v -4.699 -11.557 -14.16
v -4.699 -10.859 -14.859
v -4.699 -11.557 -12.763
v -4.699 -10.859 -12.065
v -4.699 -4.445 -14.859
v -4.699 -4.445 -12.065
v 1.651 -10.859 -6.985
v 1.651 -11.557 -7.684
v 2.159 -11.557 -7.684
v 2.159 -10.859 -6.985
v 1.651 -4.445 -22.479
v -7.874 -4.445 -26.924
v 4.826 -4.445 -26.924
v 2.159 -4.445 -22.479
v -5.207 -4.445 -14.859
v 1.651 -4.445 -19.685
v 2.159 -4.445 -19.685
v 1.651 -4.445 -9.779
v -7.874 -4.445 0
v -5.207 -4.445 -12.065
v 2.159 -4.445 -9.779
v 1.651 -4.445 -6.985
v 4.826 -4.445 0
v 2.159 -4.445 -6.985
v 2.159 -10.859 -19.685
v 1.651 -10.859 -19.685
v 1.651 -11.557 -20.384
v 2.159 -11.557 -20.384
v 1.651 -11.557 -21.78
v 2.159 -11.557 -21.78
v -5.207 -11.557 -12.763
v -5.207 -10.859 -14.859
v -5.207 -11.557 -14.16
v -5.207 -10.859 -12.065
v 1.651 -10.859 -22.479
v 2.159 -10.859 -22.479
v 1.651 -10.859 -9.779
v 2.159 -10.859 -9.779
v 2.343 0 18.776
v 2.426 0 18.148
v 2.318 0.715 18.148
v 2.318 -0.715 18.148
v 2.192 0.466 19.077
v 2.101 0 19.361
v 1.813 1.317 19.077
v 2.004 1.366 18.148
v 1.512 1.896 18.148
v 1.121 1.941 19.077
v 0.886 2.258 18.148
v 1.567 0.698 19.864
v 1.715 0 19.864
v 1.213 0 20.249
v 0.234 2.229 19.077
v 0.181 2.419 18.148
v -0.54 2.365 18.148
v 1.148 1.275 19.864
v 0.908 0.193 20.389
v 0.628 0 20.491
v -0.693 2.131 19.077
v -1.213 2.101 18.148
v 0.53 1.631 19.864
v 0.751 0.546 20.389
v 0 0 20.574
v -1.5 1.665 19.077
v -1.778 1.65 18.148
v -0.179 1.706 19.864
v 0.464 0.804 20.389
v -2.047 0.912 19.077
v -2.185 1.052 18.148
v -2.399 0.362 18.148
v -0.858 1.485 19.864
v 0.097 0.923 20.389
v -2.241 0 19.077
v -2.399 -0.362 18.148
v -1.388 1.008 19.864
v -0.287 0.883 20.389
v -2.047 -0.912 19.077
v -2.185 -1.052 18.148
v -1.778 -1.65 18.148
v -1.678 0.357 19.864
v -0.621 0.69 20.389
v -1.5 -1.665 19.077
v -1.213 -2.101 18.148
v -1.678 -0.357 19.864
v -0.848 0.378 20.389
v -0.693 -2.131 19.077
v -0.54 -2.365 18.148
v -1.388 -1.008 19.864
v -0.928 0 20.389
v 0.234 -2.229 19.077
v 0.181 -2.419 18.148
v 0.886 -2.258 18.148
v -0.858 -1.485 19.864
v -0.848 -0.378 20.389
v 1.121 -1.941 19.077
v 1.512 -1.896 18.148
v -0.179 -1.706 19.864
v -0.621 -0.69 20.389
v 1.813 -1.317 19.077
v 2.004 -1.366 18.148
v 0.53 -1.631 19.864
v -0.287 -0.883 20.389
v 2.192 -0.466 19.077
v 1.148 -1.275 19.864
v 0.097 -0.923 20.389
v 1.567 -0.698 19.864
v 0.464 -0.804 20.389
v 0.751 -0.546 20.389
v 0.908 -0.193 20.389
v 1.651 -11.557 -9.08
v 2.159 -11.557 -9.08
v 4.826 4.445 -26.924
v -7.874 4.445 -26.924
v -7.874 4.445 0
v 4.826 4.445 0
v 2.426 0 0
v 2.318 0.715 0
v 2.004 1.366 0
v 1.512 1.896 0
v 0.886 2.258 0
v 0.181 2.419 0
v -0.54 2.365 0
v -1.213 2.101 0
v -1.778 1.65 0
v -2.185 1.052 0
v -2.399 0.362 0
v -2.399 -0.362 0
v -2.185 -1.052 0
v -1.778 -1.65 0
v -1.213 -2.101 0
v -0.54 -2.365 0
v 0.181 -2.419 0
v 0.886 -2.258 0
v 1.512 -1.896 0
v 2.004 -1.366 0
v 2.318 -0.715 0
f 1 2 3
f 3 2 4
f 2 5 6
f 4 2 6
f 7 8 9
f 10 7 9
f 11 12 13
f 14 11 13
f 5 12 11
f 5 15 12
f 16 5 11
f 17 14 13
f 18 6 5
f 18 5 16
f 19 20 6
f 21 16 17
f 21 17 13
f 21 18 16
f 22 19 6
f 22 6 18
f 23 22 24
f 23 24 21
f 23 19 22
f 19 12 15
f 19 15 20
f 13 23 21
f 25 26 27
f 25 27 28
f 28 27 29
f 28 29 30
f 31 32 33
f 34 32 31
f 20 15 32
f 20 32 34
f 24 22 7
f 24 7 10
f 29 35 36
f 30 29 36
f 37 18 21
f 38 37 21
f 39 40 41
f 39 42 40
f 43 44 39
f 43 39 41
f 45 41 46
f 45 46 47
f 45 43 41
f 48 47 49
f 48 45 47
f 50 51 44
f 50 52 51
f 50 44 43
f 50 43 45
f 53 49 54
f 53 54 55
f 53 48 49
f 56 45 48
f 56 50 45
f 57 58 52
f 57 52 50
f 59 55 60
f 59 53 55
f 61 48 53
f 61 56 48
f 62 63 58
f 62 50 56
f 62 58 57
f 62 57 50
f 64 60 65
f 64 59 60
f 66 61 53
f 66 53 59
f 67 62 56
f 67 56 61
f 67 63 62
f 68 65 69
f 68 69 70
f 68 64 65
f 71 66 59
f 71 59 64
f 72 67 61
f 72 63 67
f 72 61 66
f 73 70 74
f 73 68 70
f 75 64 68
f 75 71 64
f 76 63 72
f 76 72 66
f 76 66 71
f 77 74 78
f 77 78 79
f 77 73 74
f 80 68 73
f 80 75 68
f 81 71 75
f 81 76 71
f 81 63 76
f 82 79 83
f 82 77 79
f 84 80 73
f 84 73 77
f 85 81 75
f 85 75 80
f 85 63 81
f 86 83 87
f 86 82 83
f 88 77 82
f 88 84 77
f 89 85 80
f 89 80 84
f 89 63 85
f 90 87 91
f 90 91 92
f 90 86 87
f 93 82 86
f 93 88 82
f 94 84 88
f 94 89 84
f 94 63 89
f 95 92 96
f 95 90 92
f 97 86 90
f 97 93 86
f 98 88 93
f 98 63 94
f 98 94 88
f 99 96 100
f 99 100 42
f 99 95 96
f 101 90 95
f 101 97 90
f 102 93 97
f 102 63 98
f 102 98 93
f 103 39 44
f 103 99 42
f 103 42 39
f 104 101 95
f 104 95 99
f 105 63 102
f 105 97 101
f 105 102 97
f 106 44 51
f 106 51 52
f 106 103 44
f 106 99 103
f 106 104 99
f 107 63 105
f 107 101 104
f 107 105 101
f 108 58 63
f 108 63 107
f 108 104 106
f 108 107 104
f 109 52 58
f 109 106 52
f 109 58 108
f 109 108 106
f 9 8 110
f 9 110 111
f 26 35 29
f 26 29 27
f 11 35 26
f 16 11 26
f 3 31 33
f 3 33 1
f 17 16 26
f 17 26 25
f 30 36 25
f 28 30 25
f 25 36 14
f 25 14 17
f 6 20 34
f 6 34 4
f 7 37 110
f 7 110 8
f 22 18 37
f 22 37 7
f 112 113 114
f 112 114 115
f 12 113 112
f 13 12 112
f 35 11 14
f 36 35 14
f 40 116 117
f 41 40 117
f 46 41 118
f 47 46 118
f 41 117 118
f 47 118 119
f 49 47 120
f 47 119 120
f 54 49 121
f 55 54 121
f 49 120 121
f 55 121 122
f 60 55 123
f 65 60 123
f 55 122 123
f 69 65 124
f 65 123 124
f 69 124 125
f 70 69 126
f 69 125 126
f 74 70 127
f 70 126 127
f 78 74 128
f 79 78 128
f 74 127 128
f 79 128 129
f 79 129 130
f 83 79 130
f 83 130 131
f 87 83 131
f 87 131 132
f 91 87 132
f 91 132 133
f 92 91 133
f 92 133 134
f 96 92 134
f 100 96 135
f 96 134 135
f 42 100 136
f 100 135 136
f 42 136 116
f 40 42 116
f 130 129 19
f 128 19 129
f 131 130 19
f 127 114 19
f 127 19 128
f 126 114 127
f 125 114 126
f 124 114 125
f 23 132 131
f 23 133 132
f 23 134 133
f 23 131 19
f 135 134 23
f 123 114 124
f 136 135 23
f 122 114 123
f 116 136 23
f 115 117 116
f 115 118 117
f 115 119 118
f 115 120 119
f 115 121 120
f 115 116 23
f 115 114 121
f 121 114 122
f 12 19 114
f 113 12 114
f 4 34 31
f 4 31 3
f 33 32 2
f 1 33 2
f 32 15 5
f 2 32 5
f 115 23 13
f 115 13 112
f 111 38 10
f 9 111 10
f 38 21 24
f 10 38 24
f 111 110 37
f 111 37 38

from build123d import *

# Parameters (mm, degrees)
SKETCH1_W           = 12.7
SKETCH1_H           = 8.89
BOSS_EXTRUDE1_DEPTH = 26.924
SKETCH2_R           = 2.4257
BOSS_EXTRUDE2_DEPTH = 20.574
FILLET1_R           = 2.4257
SKETCH3_W           = 0.508
SKETCH3_H           = 2.794
BOSS_EXTRUDE3_DEPTH = 7.112
CHAMFER1_SIZE       = 0.6985


with BuildPart() as part:
    # Sketch1 → Boss-Extrude1 (new body)
    with BuildSketch(Plane.XY):
        with Locations((-1.524, 0)):
            Rectangle(SKETCH1_W, SKETCH1_H)
    extrude(amount=-BOSS_EXTRUDE1_DEPTH)

    # Sketch2 → Boss-Extrude2 (add)
    with BuildSketch(Plane.XY):
        Circle(SKETCH2_R)
    extrude(amount=BOSS_EXTRUDE2_DEPTH)

    # Fillet1
    fillet1_edges = [part.edges().sort_by_distance(p)[0] for p in [
        (-2.4257, 0, 20.574),
    ]]
    fillet(fillet1_edges, radius=FILLET1_R)

    # Sketch3 → Boss-Extrude3 (add)
    with BuildSketch(Plane.XZ.offset(4.445)):
        with Locations((-4.953, -13.462)):
            Rectangle(SKETCH3_W, SKETCH3_H)
        with Locations((1.905, -21.082)):
            Rectangle(SKETCH3_W, SKETCH3_H)
        with Locations((1.905, -8.382)):
            Rectangle(SKETCH3_W, SKETCH3_H)
    extrude(amount=BOSS_EXTRUDE3_DEPTH)

    # Chamfer1
    chamfer1_edges = [part.edges().sort_by_distance(p)[0] for p in [
        (-4.953, -11.557, -14.859),
        (-4.953, -11.557, -12.065),
        (1.905, -11.557, -19.685),
        (1.905, -11.557, -22.479),
        (1.905, -11.557, -9.779),
        (1.905, -11.557, -6.985),
    ]]
    chamfer(chamfer1_edges, length=CHAMFER1_SIZE)


solid = part.part
